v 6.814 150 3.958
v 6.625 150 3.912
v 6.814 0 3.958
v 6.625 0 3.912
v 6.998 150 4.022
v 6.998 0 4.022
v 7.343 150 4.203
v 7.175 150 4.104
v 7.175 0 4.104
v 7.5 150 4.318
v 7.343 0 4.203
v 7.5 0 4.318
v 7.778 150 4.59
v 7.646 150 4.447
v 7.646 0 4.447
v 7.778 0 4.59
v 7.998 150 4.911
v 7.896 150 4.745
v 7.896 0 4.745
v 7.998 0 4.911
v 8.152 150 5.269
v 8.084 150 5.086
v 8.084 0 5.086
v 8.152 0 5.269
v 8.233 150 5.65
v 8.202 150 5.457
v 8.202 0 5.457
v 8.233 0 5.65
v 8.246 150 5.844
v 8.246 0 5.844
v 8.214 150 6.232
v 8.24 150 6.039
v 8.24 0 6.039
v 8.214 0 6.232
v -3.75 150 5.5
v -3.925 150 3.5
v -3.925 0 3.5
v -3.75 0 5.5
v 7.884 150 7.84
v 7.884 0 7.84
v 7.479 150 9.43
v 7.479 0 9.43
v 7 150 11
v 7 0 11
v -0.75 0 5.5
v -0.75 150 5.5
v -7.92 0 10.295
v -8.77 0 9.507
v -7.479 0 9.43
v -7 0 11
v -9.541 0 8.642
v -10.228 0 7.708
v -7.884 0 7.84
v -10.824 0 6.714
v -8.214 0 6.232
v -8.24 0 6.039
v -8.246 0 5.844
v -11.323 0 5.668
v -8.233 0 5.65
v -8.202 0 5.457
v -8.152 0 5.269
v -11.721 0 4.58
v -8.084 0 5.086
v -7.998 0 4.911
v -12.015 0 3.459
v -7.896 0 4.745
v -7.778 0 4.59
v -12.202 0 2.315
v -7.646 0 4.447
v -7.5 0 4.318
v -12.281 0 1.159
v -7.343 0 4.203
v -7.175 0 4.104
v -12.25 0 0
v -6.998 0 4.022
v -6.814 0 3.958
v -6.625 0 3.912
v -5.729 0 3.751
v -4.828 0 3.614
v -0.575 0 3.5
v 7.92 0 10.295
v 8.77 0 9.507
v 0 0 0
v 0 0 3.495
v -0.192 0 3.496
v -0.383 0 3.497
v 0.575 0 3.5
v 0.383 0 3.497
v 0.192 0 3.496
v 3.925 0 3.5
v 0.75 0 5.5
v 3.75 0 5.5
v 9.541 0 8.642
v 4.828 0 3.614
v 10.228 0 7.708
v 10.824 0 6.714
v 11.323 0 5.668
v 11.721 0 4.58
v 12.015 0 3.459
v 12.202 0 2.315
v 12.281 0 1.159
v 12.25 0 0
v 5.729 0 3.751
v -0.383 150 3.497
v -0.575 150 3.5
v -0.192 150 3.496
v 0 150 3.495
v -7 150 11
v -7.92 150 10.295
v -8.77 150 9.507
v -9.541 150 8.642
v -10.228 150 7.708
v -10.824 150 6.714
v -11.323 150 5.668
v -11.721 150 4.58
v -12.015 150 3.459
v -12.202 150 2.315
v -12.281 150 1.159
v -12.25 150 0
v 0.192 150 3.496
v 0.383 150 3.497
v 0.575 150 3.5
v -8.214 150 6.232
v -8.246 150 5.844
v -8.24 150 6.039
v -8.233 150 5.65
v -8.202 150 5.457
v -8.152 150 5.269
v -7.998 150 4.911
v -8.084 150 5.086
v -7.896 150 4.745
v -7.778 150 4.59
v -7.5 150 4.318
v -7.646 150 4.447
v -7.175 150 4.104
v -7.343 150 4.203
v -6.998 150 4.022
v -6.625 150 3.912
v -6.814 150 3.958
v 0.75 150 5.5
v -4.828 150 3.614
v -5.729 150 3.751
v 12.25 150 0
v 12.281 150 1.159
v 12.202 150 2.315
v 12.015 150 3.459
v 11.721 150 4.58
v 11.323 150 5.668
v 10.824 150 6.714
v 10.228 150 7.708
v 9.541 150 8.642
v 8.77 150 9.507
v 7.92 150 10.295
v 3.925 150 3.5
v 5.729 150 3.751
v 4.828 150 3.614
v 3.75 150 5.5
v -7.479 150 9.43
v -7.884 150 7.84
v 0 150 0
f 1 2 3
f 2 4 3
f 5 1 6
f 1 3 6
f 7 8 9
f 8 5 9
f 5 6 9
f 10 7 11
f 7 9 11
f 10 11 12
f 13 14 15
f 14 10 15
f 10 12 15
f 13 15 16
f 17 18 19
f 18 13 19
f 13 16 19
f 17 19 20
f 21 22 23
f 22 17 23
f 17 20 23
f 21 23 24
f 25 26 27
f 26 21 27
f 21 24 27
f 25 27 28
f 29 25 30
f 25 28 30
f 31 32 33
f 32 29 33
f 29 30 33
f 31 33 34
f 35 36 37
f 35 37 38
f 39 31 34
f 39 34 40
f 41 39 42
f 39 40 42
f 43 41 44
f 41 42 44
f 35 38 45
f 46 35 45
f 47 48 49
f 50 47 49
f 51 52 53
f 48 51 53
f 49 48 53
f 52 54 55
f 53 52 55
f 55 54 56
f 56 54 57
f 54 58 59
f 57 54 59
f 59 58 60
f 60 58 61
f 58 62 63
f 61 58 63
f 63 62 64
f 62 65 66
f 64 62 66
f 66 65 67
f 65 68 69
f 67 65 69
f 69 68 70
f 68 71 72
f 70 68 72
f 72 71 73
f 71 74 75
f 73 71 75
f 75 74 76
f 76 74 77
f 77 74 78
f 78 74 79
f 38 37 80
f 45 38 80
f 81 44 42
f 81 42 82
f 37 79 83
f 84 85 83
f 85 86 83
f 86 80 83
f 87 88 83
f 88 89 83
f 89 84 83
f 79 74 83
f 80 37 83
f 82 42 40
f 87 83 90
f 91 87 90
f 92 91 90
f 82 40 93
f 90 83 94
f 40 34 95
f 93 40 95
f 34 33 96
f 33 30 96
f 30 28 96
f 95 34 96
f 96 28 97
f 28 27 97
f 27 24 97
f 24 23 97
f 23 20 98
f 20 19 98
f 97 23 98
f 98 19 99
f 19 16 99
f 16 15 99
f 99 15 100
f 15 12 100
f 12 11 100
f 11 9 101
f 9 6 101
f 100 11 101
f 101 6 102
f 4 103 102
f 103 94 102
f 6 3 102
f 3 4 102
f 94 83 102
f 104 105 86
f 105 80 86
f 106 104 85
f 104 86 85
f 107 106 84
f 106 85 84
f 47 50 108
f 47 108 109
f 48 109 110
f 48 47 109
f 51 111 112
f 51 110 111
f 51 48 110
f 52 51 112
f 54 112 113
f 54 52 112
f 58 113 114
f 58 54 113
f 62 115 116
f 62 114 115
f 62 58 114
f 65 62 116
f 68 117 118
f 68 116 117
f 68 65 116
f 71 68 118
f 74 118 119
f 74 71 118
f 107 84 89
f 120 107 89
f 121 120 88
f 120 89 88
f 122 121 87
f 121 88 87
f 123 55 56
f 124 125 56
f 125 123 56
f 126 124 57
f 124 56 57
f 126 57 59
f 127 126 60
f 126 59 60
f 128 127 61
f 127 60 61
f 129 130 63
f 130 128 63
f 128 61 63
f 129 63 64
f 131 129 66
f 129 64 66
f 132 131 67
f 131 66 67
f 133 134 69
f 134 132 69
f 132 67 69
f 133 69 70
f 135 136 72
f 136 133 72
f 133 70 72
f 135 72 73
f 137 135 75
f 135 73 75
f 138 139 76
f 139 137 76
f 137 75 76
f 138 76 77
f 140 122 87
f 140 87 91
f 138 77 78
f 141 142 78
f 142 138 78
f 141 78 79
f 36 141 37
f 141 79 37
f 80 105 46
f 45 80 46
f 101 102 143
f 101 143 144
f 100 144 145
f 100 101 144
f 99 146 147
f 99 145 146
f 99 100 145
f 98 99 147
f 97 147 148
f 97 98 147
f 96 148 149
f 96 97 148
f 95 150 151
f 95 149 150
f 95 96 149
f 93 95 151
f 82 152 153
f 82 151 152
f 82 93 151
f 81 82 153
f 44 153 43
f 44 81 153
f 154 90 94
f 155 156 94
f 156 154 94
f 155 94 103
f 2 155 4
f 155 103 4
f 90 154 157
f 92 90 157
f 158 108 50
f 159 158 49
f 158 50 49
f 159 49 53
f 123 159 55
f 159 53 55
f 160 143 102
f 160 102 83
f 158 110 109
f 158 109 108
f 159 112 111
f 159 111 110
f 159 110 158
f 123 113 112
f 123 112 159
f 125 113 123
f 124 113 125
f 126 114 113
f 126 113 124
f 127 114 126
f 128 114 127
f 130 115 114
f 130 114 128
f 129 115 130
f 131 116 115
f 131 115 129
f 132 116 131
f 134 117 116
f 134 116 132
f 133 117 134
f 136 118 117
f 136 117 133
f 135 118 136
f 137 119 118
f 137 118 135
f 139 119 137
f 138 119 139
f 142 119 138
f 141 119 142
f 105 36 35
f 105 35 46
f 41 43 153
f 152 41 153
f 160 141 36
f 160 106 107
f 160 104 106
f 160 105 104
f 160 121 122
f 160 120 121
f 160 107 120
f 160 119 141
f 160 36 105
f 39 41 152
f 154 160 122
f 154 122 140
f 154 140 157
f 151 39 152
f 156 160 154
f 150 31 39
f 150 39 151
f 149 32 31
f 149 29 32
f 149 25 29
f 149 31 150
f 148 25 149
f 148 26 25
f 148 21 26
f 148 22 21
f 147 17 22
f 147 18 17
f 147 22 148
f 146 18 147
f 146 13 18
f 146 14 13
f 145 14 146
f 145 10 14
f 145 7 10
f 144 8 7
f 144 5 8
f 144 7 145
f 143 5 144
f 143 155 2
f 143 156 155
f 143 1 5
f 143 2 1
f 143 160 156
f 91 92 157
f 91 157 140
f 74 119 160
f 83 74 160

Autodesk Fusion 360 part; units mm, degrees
sketch "Sketch1" plane through (0, 0, 0) normal (0, 1, 0) x (1, 0, 0)
  line L0 (-12.25, 0) -> (0, 0)
  line L1 (0, 0) -> (0, -15.7252) construction
  arc A0 (-12.25, 0) -> (-7, -11) centre (0, -0.9062) ccw
  arc A1 (-8.2142, -6.2319) -> (-7, -11) centre (26.2265, 0) ccw
  arc A2 (-3.925, -3.5) -> (-6.6248, -3.9119) centre (0, -38.2792) ccw
  line L2 (-3.925, -3.5) -> (-3.75, -5.5)
  line L3 (-3.75, -5.5) -> (-0.75, -5.5)
  arc A3 (-6.6248, -3.9119) -> (-8.2142, -6.2319) centre (-6.2462, -5.8758) ccw
  line L4 (-2.25, -5.5) -> (-2.25, 0) construction
  line L5 (-0.575, -3.5) -> (-0.75, -5.5)
  arc A4 (0, -3.4953) -> (-0.575, -3.5) centre (0, -38.4953) ccw
  arc A5 (8.2142, -6.2319) -> (6.6248, -3.9119) centre (6.2462, -5.8758) ccw
  arc A6 (7, -11) -> (8.2142, -6.2319) centre (-26.2265, 0) ccw
  arc A7 (7, -11) -> (12.25, 0) centre (0, -0.9062) ccw
  line L6 (12.25, 0) -> (0, 0)
  arc A8 (6.6248, -3.9119) -> (3.925, -3.5) centre (0, -38.2792) ccw
  line L7 (3.925, -3.5) -> (3.75, -5.5)
  line L8 (3.75, -5.5) -> (0.75, -5.5)
  line L9 (0.575, -3.5) -> (0.75, -5.5)
  arc A9 (0.575, -3.5) -> (0, -3.4953) centre (0, -38.4953) ccw
  dimension "d1" = 12.25
  dimension "d3" = 11
  dimension "d4" = 7
  dimension "d6" = 2
  dimension "d7" = 95
  dimension "d8" = 3
  dimension "d9" = 0.75
  dimension "d10" = 35
  dimension "d11" = 5.5
  dimension "d12" = 2
extrude "Extrude1" add sketch "Sketch1" along normal blind 150
equation "d1 = ( 24.5 / 2 ) * 1 mm"
equation "d4 = ( 14 / 2 ) * 1 mm"
equation "d7 = 90 deg + 5 deg"
equation "d9 = ( 1.5 / 2 ) * 1 mm"
